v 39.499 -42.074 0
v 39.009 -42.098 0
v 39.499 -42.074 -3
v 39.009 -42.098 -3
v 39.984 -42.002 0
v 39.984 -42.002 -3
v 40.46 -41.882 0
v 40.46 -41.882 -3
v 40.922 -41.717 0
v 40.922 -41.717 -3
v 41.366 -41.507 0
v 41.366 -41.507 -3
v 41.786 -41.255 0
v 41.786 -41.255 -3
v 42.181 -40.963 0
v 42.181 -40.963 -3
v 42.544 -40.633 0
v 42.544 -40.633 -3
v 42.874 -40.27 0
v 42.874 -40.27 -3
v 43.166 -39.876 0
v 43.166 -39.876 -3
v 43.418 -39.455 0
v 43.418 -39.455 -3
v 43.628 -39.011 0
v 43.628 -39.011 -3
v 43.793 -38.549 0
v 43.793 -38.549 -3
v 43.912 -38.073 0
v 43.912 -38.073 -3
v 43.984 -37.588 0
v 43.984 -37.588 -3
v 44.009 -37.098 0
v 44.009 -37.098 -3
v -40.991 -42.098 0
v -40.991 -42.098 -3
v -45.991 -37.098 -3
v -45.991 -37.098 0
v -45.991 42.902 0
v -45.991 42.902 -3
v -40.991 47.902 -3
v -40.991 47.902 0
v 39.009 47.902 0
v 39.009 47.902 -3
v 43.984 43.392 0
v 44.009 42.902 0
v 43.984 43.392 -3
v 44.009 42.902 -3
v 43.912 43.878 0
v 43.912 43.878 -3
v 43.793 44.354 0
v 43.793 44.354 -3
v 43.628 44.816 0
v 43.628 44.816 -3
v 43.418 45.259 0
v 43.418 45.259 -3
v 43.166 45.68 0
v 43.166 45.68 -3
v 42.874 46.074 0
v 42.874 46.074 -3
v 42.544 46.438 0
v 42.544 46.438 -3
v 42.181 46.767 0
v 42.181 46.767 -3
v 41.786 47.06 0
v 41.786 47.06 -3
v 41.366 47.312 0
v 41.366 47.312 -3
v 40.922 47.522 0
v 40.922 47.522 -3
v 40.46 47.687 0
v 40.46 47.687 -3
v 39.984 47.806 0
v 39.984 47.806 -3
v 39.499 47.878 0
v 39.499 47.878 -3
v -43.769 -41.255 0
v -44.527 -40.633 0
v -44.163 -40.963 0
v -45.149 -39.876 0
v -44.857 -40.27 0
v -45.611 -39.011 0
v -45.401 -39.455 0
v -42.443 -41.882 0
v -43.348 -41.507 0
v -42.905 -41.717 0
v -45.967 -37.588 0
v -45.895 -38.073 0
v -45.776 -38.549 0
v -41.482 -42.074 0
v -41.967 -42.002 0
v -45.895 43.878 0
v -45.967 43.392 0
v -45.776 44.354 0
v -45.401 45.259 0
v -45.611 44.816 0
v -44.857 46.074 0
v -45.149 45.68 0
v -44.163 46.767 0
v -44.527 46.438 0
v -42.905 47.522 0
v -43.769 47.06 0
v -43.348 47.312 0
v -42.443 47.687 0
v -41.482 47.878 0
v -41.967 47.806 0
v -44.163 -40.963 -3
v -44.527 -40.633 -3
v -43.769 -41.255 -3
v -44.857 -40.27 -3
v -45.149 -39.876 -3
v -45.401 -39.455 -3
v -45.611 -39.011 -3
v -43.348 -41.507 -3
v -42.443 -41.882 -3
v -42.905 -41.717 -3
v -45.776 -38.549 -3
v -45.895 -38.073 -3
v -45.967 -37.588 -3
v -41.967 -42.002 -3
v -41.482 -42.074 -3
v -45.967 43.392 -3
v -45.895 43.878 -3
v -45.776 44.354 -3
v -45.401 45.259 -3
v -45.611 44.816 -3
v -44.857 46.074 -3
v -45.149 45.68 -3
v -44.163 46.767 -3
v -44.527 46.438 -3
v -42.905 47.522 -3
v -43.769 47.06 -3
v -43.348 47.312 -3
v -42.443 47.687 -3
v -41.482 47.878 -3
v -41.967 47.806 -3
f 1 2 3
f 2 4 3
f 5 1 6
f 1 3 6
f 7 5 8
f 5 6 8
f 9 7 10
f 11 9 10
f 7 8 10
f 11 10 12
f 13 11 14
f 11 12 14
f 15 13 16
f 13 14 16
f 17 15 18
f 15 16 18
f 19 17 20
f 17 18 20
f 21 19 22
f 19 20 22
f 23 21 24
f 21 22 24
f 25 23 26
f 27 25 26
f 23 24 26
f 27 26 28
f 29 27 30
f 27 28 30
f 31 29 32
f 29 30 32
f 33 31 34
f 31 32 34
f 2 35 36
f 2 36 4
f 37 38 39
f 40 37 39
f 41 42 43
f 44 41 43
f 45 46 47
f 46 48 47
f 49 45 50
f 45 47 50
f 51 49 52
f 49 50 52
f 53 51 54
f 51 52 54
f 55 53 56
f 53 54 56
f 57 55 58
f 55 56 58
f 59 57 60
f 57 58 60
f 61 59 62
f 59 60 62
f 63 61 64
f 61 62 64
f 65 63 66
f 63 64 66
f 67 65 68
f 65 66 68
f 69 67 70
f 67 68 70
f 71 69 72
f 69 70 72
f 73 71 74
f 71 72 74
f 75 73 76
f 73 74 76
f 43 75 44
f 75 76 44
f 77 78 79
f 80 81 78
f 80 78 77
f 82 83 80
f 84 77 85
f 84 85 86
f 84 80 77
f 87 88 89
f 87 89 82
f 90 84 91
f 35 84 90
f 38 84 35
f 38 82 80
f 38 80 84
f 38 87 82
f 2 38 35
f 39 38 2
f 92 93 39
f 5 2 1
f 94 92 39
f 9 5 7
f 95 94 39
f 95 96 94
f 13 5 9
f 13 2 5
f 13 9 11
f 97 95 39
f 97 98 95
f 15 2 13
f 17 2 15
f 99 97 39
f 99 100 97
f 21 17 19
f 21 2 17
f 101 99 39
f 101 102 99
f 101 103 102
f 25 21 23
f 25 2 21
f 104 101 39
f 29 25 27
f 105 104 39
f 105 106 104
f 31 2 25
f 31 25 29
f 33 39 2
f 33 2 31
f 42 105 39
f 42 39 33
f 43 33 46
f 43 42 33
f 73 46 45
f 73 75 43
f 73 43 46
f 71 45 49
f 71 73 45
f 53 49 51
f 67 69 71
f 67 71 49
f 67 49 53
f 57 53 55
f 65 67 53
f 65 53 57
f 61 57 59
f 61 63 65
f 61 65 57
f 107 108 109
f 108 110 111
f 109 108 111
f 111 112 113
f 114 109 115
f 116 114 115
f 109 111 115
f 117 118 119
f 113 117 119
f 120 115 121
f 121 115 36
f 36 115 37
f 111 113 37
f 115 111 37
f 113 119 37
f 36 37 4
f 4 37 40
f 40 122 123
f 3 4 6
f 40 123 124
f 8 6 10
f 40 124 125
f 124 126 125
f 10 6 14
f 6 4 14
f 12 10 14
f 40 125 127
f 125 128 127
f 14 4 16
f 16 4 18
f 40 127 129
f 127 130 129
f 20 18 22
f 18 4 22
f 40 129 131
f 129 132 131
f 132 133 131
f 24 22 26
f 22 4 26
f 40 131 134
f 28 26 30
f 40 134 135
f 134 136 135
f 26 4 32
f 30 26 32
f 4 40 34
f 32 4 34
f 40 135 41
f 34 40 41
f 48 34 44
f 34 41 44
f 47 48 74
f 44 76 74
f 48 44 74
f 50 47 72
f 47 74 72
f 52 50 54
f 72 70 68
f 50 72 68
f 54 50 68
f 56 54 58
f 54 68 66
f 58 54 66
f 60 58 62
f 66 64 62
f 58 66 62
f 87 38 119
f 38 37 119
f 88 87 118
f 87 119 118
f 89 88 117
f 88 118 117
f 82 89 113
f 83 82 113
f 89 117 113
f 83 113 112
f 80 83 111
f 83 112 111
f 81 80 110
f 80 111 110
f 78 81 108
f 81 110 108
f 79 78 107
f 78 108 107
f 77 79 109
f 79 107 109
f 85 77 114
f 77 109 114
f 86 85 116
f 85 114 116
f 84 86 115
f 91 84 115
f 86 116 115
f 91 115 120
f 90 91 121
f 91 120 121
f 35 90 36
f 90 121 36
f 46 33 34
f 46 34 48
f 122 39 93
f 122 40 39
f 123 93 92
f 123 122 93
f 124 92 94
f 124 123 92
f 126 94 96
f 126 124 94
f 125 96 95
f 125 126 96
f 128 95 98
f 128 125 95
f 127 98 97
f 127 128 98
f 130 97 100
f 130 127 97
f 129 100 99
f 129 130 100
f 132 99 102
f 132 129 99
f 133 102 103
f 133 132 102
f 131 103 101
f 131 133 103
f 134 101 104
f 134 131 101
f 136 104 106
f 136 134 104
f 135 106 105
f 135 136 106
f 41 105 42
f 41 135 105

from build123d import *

# Parameters (mm, degrees)
F0_W     = 90
F0_H     = 90
F1_DEPTH = 3
F2_R     = 5


# Not quite as in the source:
# - a feature of the source that left no trace in its solid (it failed there, or was rolled back) is left out


with BuildPart() as f1:
    # F0 (on Top) → F1 (new body)
    with BuildSketch(Plane.XY):
        with Locations((-0.9914580733, 2.9022350864)):
            Rectangle(F0_W, F0_H)
    extrude(amount=-F1_DEPTH)

    # F2
    f2_edges = [f1.edges().sort_by_distance(p)[0] for p in [
        (-45.991458, 47.902235, -1.5),
        (44.008542, 47.902235, -1.5),
        (-45.991458, -42.097765, -1.5),
        (44.008542, -42.097765, -1.5),
    ]]
    fillet(f2_edges, radius=F2_R)


solid = f1.part
